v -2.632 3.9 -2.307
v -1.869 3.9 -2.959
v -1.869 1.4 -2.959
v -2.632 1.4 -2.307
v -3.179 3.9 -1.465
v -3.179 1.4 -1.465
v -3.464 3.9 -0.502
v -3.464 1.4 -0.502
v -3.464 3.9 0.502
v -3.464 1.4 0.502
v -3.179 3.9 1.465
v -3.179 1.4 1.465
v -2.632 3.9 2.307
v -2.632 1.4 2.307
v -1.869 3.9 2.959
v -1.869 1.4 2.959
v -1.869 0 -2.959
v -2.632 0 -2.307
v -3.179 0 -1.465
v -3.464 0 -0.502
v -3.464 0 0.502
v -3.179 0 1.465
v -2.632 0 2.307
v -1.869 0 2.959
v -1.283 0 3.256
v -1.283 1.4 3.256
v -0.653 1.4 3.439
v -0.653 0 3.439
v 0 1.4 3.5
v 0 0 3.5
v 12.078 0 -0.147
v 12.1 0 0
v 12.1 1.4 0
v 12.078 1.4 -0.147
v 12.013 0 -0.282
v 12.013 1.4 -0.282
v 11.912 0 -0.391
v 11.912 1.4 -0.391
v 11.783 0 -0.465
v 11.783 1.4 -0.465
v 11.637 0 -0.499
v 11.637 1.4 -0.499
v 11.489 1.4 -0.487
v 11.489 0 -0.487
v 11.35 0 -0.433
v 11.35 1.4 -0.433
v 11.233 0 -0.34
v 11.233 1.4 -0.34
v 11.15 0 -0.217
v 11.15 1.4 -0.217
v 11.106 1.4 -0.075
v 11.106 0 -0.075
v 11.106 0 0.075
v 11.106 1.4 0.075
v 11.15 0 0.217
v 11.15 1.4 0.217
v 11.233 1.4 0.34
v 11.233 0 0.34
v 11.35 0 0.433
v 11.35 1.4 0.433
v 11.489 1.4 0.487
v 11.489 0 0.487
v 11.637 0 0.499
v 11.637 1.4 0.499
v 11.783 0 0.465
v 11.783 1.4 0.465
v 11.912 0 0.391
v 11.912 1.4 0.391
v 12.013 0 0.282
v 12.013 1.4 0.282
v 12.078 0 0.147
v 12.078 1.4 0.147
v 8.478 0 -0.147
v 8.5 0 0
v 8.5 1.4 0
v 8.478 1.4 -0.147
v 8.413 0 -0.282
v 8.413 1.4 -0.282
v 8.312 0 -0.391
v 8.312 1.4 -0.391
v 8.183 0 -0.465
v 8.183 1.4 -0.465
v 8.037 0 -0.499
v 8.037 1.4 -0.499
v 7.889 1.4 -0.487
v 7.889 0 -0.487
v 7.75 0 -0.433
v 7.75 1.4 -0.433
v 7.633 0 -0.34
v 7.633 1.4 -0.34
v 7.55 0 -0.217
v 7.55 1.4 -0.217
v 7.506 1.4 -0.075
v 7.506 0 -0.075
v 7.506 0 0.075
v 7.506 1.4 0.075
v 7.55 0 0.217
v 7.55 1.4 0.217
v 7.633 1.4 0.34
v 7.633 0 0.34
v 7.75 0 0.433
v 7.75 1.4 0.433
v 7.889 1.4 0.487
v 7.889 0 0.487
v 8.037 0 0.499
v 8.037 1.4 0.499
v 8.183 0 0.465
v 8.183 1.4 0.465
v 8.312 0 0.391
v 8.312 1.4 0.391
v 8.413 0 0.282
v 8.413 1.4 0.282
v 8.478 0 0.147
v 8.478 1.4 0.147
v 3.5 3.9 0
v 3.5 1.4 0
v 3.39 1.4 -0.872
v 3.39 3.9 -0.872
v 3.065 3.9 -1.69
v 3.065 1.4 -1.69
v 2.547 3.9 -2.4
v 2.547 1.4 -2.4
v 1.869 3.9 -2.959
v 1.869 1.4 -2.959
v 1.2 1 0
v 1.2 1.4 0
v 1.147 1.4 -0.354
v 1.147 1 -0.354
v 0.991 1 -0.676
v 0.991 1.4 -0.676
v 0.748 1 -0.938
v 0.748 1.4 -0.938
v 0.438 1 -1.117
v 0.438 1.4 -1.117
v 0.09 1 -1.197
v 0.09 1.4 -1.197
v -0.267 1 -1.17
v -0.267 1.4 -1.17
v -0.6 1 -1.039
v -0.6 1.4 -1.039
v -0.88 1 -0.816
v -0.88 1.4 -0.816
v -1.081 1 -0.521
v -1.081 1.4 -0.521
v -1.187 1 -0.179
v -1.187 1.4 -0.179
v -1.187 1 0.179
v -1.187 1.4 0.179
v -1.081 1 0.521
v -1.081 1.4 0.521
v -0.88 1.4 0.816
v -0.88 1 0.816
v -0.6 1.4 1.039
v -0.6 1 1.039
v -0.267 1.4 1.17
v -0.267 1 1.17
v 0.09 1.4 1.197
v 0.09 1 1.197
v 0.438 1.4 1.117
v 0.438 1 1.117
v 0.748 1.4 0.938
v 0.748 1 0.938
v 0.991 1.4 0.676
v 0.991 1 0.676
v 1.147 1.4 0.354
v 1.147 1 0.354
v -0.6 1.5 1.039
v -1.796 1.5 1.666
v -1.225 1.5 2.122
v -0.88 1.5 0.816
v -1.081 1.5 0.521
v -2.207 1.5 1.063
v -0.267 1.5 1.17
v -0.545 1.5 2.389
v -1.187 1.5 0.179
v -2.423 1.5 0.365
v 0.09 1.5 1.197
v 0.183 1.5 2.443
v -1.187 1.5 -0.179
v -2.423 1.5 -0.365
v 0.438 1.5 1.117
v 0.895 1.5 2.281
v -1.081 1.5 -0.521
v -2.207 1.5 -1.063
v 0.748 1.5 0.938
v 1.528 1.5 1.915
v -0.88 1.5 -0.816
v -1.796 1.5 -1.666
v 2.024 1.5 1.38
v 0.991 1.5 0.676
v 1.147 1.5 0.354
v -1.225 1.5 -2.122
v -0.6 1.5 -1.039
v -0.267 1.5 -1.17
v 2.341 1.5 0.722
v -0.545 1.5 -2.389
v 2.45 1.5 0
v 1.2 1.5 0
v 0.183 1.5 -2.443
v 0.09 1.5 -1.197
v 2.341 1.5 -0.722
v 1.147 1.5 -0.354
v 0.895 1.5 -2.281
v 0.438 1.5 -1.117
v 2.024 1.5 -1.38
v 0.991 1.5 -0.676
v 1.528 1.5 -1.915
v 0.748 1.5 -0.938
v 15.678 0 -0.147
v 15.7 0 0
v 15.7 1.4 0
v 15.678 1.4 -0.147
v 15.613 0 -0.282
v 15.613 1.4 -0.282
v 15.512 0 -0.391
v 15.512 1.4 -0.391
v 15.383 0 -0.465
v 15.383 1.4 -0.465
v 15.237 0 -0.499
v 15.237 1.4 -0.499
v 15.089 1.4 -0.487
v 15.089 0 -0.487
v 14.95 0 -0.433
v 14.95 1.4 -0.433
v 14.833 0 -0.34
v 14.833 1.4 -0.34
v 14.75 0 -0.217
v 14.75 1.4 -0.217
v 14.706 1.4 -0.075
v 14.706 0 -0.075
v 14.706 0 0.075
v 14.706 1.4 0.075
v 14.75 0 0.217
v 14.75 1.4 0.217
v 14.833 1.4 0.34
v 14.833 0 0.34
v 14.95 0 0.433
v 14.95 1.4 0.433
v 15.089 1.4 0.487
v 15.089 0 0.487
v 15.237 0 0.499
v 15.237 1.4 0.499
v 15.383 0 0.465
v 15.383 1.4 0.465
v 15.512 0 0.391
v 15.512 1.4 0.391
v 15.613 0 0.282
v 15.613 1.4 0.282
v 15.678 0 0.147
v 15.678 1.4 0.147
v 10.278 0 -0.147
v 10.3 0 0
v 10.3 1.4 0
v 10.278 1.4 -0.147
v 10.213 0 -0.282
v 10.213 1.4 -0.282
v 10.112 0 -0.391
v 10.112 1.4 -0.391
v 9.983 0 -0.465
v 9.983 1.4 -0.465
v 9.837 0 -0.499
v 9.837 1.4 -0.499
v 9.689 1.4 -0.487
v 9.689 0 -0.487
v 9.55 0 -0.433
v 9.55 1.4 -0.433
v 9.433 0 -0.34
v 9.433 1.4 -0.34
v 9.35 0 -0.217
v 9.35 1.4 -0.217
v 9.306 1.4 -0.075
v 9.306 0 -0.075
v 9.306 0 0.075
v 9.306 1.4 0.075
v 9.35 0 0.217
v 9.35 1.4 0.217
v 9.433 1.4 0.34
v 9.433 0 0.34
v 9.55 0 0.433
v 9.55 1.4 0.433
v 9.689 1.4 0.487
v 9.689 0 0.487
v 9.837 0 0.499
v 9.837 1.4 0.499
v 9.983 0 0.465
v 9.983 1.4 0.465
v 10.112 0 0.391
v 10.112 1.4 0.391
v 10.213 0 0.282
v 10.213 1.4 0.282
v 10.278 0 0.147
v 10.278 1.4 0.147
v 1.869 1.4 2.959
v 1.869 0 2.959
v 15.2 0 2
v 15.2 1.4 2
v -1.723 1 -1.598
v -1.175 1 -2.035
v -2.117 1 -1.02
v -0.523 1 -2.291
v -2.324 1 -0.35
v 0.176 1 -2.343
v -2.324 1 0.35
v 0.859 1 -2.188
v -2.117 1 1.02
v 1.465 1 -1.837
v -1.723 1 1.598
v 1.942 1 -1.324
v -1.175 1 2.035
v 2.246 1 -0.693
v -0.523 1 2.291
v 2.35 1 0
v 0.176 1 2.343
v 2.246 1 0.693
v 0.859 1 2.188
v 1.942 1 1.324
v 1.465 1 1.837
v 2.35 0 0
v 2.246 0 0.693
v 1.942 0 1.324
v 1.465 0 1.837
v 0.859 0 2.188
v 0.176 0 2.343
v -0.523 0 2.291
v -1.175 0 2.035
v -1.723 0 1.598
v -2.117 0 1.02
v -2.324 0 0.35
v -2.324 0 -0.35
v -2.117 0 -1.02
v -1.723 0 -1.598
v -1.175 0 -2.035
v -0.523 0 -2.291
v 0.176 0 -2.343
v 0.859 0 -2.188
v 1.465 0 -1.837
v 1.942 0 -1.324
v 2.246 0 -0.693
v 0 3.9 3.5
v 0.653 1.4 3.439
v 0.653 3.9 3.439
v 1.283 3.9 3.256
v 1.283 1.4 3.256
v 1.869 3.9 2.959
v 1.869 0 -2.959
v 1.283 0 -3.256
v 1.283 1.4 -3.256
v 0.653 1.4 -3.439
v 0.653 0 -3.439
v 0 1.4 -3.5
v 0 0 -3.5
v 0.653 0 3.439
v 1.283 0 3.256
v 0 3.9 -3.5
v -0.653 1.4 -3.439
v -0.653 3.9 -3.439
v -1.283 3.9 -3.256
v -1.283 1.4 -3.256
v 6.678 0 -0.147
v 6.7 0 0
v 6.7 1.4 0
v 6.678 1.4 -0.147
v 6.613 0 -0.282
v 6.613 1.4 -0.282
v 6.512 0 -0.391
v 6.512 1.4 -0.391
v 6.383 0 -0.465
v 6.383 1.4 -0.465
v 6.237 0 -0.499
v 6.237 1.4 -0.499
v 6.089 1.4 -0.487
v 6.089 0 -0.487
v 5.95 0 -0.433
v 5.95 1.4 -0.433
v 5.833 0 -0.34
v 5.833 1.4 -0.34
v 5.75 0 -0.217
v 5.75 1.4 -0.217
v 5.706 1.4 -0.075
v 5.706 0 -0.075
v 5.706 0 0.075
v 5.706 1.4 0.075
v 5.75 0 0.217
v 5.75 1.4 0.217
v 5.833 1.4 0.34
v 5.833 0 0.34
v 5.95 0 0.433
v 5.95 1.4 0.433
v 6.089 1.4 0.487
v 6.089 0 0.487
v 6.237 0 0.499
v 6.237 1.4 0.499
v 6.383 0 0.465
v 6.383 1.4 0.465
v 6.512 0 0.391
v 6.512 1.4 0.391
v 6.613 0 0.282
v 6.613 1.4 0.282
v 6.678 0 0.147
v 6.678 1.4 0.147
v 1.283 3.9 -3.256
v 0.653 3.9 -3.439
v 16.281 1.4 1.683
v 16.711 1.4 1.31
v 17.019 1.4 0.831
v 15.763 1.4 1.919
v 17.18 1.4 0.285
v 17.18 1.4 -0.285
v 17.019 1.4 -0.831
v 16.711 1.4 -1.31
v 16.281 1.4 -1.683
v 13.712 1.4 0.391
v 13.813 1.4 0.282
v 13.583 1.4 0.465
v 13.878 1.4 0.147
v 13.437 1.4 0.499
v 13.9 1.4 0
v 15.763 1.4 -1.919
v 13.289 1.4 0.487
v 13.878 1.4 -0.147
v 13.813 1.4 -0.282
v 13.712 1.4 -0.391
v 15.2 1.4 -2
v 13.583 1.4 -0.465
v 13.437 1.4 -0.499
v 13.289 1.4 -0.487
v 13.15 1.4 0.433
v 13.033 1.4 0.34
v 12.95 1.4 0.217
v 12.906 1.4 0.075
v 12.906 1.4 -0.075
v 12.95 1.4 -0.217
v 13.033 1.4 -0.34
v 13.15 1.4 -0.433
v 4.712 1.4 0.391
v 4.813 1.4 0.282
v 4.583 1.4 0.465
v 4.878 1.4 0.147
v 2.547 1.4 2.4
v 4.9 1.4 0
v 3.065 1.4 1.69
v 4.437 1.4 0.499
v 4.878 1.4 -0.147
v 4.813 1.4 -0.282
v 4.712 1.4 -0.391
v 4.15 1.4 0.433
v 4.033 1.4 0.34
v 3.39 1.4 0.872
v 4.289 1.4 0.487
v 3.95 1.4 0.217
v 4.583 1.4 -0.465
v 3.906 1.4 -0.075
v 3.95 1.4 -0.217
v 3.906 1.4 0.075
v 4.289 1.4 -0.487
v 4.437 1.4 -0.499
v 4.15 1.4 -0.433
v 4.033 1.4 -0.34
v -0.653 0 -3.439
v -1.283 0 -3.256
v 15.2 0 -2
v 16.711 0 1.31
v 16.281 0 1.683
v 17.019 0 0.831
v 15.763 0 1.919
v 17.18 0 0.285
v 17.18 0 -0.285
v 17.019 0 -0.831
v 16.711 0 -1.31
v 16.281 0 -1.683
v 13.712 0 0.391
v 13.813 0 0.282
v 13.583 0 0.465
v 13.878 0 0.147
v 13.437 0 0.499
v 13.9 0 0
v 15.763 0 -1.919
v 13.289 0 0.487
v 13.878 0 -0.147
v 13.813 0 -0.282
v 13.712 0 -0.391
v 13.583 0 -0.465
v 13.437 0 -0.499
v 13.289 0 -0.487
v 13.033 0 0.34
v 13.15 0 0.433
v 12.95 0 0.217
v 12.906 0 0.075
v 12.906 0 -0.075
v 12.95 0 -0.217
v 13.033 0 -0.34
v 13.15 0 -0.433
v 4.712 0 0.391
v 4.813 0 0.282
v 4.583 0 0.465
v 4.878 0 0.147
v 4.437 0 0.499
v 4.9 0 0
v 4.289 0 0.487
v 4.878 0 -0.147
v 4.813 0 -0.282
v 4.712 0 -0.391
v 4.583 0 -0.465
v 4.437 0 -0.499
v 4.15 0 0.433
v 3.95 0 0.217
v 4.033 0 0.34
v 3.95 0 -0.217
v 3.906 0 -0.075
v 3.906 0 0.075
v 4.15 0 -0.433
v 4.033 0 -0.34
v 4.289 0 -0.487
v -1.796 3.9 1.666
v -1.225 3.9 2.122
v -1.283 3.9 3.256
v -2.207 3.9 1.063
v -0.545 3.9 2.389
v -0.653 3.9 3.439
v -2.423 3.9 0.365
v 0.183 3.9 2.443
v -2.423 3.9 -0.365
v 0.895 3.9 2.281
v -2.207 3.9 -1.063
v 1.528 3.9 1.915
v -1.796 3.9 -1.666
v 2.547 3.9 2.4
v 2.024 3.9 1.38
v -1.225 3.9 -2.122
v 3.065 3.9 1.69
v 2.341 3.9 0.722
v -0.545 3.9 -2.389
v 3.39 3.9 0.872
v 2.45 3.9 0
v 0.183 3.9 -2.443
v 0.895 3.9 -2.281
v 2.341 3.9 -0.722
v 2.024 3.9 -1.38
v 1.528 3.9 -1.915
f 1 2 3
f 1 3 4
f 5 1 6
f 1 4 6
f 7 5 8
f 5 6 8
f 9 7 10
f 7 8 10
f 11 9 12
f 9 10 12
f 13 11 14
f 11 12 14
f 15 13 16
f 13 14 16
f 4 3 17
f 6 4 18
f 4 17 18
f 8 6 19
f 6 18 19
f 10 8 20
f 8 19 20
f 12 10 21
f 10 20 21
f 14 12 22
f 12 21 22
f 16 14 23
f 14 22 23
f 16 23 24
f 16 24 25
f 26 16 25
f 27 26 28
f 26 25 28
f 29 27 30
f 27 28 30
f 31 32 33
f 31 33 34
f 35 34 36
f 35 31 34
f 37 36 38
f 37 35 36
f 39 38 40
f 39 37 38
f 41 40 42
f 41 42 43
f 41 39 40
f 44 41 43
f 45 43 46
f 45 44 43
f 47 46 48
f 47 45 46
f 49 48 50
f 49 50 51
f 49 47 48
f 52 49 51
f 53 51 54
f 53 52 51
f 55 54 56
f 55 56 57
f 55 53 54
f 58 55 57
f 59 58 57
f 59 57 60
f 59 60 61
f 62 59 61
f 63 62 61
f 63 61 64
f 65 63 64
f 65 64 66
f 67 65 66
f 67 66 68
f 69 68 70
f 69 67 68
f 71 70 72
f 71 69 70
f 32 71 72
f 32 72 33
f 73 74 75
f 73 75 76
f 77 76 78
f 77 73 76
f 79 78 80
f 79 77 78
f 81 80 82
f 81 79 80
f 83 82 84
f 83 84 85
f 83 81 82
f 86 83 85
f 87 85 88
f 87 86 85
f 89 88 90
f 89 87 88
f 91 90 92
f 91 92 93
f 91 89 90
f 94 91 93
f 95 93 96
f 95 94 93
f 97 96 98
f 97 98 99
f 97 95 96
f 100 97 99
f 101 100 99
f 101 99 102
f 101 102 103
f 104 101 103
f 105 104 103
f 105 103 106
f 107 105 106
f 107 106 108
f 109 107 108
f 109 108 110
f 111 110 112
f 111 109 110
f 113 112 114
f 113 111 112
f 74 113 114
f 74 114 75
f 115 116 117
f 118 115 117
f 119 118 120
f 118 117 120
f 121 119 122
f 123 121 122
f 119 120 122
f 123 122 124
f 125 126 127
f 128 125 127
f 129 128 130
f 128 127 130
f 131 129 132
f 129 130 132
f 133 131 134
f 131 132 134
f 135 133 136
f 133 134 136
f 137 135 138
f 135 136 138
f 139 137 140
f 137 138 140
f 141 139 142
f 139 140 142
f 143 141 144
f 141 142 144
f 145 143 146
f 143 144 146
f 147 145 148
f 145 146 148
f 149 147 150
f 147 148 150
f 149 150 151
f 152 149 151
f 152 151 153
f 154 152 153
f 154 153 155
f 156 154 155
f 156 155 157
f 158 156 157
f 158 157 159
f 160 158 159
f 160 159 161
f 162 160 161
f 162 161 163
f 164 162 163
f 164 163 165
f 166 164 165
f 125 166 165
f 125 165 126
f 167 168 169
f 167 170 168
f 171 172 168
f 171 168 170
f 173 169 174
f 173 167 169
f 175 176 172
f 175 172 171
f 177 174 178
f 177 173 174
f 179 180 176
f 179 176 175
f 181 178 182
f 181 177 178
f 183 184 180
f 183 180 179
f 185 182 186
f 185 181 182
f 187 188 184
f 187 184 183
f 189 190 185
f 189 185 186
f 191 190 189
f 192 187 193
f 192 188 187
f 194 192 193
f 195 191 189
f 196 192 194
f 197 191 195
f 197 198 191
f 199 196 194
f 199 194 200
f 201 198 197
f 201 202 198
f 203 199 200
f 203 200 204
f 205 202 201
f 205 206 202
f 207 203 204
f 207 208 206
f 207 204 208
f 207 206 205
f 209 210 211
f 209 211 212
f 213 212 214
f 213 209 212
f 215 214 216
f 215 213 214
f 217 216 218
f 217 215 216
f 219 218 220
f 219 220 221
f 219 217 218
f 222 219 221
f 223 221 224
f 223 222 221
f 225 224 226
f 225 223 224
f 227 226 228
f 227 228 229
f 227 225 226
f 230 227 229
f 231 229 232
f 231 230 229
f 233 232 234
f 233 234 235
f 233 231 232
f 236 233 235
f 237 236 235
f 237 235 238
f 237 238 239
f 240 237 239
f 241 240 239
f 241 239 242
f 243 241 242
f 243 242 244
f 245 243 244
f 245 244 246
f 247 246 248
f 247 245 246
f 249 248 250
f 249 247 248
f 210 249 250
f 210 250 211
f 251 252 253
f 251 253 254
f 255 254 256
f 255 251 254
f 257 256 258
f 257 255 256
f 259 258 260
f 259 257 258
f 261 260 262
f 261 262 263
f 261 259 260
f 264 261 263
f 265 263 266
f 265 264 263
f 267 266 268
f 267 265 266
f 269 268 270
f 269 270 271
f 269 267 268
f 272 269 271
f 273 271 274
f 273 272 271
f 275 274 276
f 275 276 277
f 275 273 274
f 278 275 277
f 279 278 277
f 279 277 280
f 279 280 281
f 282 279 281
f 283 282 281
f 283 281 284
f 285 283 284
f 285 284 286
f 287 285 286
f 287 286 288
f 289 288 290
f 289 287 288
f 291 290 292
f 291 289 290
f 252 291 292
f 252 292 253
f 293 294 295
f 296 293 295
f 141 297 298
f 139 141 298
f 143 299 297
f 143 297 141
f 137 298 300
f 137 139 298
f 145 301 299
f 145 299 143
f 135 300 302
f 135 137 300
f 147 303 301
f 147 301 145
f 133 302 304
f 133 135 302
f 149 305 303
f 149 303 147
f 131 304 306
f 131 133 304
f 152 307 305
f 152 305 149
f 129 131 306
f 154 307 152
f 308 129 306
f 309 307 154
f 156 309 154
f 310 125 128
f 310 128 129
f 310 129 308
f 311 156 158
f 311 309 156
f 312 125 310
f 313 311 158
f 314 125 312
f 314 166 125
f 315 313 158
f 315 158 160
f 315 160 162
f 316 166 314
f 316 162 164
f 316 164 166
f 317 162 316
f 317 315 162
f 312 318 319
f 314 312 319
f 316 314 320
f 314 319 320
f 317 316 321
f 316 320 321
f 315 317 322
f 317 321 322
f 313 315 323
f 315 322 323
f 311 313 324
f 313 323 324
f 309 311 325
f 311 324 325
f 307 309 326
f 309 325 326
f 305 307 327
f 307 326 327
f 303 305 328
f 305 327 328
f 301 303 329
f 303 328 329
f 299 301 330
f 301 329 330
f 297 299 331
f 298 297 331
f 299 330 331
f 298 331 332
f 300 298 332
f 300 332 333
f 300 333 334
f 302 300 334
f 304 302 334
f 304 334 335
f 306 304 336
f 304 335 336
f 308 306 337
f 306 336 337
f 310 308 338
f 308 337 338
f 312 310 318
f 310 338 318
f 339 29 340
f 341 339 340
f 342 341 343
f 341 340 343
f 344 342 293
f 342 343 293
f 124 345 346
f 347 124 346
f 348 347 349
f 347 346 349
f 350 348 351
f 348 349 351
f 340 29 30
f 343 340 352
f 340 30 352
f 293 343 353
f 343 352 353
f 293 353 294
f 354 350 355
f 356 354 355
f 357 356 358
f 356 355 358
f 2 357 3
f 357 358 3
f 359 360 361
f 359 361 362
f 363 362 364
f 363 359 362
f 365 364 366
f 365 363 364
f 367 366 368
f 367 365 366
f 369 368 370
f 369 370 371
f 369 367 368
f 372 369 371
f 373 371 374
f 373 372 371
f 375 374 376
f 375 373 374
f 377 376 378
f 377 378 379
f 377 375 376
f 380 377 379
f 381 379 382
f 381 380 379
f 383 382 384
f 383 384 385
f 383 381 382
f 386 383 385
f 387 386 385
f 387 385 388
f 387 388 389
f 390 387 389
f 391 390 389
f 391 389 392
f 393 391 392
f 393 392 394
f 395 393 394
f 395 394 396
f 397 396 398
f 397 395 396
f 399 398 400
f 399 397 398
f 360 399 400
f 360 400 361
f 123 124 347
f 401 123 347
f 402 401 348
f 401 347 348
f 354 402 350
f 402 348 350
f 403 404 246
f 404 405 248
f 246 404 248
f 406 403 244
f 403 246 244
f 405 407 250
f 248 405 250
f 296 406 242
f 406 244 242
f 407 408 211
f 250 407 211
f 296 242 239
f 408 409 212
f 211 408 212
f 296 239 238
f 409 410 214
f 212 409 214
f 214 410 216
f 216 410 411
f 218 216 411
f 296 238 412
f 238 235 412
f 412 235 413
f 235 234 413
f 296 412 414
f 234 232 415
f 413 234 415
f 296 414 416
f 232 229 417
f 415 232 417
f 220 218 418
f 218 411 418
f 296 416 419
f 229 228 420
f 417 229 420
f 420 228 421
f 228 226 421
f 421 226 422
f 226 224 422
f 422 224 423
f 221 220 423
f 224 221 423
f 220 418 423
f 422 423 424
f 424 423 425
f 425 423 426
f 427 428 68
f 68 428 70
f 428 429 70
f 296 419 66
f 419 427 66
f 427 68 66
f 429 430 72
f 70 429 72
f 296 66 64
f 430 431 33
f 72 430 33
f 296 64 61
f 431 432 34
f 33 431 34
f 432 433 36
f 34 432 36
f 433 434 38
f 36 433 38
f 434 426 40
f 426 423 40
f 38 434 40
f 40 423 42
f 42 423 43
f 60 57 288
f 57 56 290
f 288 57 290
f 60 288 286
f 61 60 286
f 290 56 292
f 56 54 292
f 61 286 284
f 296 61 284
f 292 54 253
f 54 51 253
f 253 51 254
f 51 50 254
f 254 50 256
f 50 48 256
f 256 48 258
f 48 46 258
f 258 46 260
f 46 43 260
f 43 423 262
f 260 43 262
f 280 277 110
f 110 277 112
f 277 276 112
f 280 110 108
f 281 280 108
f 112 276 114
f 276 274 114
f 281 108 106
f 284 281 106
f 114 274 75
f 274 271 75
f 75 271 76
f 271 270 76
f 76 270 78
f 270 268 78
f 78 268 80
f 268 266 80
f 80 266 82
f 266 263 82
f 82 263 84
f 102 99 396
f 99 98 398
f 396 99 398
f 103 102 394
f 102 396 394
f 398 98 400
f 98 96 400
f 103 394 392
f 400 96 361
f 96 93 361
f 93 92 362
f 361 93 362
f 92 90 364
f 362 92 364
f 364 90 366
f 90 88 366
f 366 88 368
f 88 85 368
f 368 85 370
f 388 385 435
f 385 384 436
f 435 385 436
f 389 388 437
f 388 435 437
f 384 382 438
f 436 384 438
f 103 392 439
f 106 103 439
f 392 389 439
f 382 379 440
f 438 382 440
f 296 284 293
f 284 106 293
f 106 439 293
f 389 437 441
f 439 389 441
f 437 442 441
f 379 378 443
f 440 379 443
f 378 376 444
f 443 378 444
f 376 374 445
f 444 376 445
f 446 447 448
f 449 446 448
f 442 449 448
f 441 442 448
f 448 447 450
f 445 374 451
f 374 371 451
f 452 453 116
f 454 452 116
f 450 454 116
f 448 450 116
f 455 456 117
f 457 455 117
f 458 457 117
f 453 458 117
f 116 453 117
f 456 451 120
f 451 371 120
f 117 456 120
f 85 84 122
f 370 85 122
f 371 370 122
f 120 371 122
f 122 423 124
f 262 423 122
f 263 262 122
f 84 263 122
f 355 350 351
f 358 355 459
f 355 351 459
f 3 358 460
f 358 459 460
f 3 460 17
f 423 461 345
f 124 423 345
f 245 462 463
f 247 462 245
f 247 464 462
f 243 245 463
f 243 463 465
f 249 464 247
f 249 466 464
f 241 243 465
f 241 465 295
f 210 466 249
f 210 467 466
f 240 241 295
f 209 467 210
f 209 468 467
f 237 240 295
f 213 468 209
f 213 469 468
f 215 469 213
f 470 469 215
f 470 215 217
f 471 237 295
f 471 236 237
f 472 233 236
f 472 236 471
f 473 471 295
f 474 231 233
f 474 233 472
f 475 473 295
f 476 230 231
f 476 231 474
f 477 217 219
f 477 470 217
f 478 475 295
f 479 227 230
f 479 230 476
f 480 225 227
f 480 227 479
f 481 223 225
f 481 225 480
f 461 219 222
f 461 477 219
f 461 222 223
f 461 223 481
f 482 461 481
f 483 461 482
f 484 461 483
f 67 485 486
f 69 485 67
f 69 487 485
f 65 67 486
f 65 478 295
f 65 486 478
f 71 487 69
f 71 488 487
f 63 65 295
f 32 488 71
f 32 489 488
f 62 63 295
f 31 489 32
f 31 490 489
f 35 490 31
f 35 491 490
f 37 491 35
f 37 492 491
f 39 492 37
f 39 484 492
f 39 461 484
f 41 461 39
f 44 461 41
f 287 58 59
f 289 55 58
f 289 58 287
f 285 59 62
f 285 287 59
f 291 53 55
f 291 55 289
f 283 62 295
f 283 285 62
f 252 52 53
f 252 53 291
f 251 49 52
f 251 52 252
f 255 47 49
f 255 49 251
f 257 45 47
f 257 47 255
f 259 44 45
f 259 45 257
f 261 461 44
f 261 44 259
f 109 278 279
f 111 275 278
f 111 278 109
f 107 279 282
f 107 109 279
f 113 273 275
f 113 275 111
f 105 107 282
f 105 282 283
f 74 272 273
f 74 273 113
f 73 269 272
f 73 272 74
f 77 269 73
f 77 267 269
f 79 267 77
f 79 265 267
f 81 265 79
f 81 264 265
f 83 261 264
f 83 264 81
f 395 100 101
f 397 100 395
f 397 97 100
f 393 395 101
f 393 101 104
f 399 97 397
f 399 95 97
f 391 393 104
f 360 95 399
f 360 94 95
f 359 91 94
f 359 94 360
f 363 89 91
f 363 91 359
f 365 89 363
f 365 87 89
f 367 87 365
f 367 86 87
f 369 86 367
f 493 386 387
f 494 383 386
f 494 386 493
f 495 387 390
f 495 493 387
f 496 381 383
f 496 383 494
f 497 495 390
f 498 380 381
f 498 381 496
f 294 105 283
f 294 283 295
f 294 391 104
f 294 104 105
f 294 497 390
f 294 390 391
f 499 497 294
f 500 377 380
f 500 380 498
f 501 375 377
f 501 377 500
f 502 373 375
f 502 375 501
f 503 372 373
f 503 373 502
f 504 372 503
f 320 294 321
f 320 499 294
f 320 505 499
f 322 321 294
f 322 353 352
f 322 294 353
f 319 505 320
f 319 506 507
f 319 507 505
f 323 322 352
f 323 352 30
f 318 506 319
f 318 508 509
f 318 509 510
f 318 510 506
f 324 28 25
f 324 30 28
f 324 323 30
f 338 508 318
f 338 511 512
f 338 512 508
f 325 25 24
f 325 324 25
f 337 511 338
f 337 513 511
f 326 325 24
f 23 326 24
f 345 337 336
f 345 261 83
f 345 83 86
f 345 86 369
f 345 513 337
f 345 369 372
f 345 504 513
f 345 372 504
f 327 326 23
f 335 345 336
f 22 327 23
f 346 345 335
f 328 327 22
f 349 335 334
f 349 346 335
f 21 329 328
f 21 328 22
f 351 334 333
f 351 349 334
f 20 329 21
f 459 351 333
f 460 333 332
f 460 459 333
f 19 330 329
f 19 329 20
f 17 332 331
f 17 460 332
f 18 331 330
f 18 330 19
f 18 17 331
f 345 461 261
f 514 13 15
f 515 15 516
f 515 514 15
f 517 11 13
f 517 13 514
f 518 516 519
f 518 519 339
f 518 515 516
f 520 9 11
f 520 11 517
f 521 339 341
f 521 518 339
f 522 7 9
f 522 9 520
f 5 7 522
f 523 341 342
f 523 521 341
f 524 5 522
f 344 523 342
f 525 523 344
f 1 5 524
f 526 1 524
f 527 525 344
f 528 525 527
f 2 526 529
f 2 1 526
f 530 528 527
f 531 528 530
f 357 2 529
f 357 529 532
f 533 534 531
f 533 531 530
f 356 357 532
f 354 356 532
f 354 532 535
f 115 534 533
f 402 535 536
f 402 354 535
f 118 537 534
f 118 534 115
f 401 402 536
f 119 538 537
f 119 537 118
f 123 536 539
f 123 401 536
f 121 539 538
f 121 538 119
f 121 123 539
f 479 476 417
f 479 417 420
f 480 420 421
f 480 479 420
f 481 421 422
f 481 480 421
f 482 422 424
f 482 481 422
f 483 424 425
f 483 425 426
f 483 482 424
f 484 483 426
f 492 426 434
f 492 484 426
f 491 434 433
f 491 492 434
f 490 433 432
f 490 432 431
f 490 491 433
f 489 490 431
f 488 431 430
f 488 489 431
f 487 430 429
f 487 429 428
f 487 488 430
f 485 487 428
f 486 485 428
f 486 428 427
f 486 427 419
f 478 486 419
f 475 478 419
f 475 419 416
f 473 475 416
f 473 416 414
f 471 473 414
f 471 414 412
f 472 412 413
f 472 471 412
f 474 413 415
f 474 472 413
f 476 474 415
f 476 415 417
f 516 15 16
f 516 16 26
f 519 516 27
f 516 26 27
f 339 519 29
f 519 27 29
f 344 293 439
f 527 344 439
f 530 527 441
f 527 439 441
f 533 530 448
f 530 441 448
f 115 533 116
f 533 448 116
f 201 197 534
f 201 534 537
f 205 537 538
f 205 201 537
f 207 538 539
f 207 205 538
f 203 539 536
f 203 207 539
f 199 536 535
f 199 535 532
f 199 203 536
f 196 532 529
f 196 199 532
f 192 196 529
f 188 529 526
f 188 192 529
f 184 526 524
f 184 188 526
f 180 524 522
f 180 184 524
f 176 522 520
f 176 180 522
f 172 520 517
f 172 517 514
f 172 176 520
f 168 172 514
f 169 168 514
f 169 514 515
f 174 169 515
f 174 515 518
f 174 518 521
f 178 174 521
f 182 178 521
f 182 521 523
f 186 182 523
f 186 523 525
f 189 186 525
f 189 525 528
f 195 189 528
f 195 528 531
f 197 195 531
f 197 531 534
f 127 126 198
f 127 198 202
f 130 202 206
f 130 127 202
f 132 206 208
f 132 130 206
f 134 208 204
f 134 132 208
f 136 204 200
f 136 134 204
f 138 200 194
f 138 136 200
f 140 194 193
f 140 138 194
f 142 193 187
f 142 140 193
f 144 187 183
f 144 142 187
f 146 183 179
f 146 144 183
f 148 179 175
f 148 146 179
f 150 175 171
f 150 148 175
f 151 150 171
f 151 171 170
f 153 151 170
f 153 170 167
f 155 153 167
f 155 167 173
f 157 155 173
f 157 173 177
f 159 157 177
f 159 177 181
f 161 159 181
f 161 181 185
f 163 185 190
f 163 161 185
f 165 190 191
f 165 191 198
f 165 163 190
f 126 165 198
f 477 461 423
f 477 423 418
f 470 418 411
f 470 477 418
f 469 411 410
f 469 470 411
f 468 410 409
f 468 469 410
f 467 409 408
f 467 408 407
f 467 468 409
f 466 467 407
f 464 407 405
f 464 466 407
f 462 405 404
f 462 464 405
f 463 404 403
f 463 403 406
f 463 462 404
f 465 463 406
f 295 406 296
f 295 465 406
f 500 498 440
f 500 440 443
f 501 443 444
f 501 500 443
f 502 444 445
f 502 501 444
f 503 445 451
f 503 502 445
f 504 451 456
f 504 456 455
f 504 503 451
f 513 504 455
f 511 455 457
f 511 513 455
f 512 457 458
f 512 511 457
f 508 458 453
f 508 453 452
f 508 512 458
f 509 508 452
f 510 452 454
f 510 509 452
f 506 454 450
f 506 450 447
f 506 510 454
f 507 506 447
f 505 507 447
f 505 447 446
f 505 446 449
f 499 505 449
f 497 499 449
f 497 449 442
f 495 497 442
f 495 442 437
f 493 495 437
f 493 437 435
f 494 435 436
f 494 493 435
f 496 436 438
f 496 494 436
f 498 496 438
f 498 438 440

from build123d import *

# Parameters (mm, degrees)
SKETCH1_R           = 0.5
BOSS_EXTRUDE1_DEPTH = 1.4
SKETCH2_R           = 2.35
CUT_EXTRUDE1_DEPTH  = 1
SKETCH3_R           = 3.5
SKETCH3_R_2         = 2.45
BOSS_EXTRUDE2_DEPTH = 2.5
SKETCH4_R           = 1.2
CUT_EXTRUDE2_DEPTH  = 2.4
SKETCH5_R           = 2.45
SKETCH5_R_2         = 1.2
BOSS_EXTRUDE3_DEPTH = 0.1
SKETCH6_W           = 35.735260114
SKETCH6_H           = 17.672039004
CUT_EXTRUDE4_DEPTH  = 4.9
CUT_EXTRUDE5_DEPTH  = 4.9


with BuildPart() as part:
    # Sketch1 → Boss-Extrude1 (new body)
    with BuildSketch(Plane(origin=(0, 0, 0), x_dir=(1, 0, 0), z_dir=(0, 1, 0))):
        with BuildLine():
            Line((-15.2, 2), (-2, 2.95))
            Line((-2, 2.95), (-2, 6.35))
            ThreePointArc((-2, 6.35), (0, 8.35), (2, 6.35))
            Line((2, 6.35), (2, 3.5))
            Line((2, 3.5), (15.2, 2))
            ThreePointArc((15.2, 2), (17.2, 0), (15.2, -2))
            Line((15.2, -2), (2, -3.5))
            Line((2, -3.5), (2, -6.35))
            ThreePointArc((2, -6.35), (0, -8.35), (-2, -6.35))
            Line((-2, -6.35), (-2, -2.95))
            Line((-2, -2.95), (-15.2, -2))
            ThreePointArc((-15.2, -2), (-17.2, 0), (-15.2, 2))
        make_face()
        with Locations((0, 6.35)):
            Circle(SKETCH1_R, mode=Mode.SUBTRACT)
        with Locations((0, 4.55)):
            Circle(SKETCH1_R, mode=Mode.SUBTRACT)
        with Locations((0, -4.55)):
            Circle(SKETCH1_R, mode=Mode.SUBTRACT)
        with Locations((0, -6.35)):
            Circle(SKETCH1_R, mode=Mode.SUBTRACT)
        with Locations((-15.2, 0)):
            Circle(SKETCH1_R, mode=Mode.SUBTRACT)
        with Locations((15.2, 0)):
            Circle(SKETCH1_R, mode=Mode.SUBTRACT)
        with Locations((-13.4, 0)):
            Circle(SKETCH1_R, mode=Mode.SUBTRACT)
        with Locations((-11.6, 0)):
            Circle(SKETCH1_R, mode=Mode.SUBTRACT)
        with Locations((-9.8, 0)):
            Circle(SKETCH1_R, mode=Mode.SUBTRACT)
        with Locations((-8, 0)):
            Circle(SKETCH1_R, mode=Mode.SUBTRACT)
        with Locations((-6.2, 0)):
            Circle(SKETCH1_R, mode=Mode.SUBTRACT)
        with Locations((-4.4, 0)):
            Circle(SKETCH1_R, mode=Mode.SUBTRACT)
        with Locations((13.4, 0)):
            Circle(SKETCH1_R, mode=Mode.SUBTRACT)
        with Locations((11.6, 0)):
            Circle(SKETCH1_R, mode=Mode.SUBTRACT)
        with Locations((9.8, 0)):
            Circle(SKETCH1_R, mode=Mode.SUBTRACT)
        with Locations((8, 0)):
            Circle(SKETCH1_R, mode=Mode.SUBTRACT)
        with Locations((6.2, 0)):
            Circle(SKETCH1_R, mode=Mode.SUBTRACT)
        with Locations((4.4, 0)):
            Circle(SKETCH1_R, mode=Mode.SUBTRACT)
    extrude(amount=BOSS_EXTRUDE1_DEPTH)

    # Sketch2 → Cut-Extrude1 (cut)
    with BuildSketch(Plane.XZ):
        Circle(SKETCH2_R)
    extrude(amount=-CUT_EXTRUDE1_DEPTH, mode=Mode.SUBTRACT)

    # Sketch3 → Boss-Extrude2 (add)
    with BuildSketch(Plane(origin=(0, 1.4, 0), x_dir=(1, 0, 0), z_dir=(0, 1, 0))):
        Circle(SKETCH3_R)
        Circle(SKETCH3_R_2, mode=Mode.SUBTRACT)
    extrude(amount=BOSS_EXTRUDE2_DEPTH)

    # Sketch4 → Cut-Extrude2 (cut, through all)
    with BuildSketch(Plane(origin=(0, 1.4, 0), x_dir=(1, 0, 0), z_dir=(0, 1, 0))):
        Circle(SKETCH4_R)
    extrude(amount=-CUT_EXTRUDE2_DEPTH, mode=Mode.SUBTRACT)

    # Sketch5 → Boss-Extrude3 (add)
    with BuildSketch(Plane(origin=(0, 1.4, 0), x_dir=(1, 0, 0), z_dir=(0, 1, 0))):
        Circle(SKETCH5_R)
        Circle(SKETCH5_R_2, mode=Mode.SUBTRACT)
    extrude(amount=BOSS_EXTRUDE3_DEPTH)

    # Sketch6 → Cut-Extrude4 (cut, through all)
    with BuildSketch(Plane.XZ):
        Rectangle(SKETCH6_W, SKETCH6_H)
        with BuildLine():
            Line((-1.868584713, -2.959457918), (-15.2, -2))
            ThreePointArc((-15.2, -2), (-17.2, 0), (-15.2, 2))
            Line((-15.2, 2), (-1.868584713, 2.959457918))
            ThreePointArc((-1.868584713, 2.959457918), (0, 3.5), (1.868584713, 2.959457918))
            Line((1.868584713, 2.959457918), (15.2, 2))
            ThreePointArc((15.2, 2), (17.2, 0), (15.2, -2))
            Line((15.2, -2), (1.868584713, -2.959457918))
            ThreePointArc((1.868584713, -2.959457918), (0, -3.5), (-1.868584713, -2.959457918))
        make_face(mode=Mode.SUBTRACT)
    extrude(amount=-CUT_EXTRUDE4_DEPTH, mode=Mode.SUBTRACT)

    # Sketch7 → Cut-Extrude5 (cut, through all)
    with BuildSketch(Plane.XZ):
        with BuildLine():
            Line((0, 3.5), (-17.731768104, 3.5))
            Line((-17.731768104, 3.5), (-17.731768104, -3.5))
            Line((-17.731768104, -3.5), (0, -3.5))
            ThreePointArc((0, -3.5), (-3.5, 0), (0, 3.5))
        make_face()
    extrude(amount=-CUT_EXTRUDE5_DEPTH, mode=Mode.SUBTRACT)


solid = part.part
